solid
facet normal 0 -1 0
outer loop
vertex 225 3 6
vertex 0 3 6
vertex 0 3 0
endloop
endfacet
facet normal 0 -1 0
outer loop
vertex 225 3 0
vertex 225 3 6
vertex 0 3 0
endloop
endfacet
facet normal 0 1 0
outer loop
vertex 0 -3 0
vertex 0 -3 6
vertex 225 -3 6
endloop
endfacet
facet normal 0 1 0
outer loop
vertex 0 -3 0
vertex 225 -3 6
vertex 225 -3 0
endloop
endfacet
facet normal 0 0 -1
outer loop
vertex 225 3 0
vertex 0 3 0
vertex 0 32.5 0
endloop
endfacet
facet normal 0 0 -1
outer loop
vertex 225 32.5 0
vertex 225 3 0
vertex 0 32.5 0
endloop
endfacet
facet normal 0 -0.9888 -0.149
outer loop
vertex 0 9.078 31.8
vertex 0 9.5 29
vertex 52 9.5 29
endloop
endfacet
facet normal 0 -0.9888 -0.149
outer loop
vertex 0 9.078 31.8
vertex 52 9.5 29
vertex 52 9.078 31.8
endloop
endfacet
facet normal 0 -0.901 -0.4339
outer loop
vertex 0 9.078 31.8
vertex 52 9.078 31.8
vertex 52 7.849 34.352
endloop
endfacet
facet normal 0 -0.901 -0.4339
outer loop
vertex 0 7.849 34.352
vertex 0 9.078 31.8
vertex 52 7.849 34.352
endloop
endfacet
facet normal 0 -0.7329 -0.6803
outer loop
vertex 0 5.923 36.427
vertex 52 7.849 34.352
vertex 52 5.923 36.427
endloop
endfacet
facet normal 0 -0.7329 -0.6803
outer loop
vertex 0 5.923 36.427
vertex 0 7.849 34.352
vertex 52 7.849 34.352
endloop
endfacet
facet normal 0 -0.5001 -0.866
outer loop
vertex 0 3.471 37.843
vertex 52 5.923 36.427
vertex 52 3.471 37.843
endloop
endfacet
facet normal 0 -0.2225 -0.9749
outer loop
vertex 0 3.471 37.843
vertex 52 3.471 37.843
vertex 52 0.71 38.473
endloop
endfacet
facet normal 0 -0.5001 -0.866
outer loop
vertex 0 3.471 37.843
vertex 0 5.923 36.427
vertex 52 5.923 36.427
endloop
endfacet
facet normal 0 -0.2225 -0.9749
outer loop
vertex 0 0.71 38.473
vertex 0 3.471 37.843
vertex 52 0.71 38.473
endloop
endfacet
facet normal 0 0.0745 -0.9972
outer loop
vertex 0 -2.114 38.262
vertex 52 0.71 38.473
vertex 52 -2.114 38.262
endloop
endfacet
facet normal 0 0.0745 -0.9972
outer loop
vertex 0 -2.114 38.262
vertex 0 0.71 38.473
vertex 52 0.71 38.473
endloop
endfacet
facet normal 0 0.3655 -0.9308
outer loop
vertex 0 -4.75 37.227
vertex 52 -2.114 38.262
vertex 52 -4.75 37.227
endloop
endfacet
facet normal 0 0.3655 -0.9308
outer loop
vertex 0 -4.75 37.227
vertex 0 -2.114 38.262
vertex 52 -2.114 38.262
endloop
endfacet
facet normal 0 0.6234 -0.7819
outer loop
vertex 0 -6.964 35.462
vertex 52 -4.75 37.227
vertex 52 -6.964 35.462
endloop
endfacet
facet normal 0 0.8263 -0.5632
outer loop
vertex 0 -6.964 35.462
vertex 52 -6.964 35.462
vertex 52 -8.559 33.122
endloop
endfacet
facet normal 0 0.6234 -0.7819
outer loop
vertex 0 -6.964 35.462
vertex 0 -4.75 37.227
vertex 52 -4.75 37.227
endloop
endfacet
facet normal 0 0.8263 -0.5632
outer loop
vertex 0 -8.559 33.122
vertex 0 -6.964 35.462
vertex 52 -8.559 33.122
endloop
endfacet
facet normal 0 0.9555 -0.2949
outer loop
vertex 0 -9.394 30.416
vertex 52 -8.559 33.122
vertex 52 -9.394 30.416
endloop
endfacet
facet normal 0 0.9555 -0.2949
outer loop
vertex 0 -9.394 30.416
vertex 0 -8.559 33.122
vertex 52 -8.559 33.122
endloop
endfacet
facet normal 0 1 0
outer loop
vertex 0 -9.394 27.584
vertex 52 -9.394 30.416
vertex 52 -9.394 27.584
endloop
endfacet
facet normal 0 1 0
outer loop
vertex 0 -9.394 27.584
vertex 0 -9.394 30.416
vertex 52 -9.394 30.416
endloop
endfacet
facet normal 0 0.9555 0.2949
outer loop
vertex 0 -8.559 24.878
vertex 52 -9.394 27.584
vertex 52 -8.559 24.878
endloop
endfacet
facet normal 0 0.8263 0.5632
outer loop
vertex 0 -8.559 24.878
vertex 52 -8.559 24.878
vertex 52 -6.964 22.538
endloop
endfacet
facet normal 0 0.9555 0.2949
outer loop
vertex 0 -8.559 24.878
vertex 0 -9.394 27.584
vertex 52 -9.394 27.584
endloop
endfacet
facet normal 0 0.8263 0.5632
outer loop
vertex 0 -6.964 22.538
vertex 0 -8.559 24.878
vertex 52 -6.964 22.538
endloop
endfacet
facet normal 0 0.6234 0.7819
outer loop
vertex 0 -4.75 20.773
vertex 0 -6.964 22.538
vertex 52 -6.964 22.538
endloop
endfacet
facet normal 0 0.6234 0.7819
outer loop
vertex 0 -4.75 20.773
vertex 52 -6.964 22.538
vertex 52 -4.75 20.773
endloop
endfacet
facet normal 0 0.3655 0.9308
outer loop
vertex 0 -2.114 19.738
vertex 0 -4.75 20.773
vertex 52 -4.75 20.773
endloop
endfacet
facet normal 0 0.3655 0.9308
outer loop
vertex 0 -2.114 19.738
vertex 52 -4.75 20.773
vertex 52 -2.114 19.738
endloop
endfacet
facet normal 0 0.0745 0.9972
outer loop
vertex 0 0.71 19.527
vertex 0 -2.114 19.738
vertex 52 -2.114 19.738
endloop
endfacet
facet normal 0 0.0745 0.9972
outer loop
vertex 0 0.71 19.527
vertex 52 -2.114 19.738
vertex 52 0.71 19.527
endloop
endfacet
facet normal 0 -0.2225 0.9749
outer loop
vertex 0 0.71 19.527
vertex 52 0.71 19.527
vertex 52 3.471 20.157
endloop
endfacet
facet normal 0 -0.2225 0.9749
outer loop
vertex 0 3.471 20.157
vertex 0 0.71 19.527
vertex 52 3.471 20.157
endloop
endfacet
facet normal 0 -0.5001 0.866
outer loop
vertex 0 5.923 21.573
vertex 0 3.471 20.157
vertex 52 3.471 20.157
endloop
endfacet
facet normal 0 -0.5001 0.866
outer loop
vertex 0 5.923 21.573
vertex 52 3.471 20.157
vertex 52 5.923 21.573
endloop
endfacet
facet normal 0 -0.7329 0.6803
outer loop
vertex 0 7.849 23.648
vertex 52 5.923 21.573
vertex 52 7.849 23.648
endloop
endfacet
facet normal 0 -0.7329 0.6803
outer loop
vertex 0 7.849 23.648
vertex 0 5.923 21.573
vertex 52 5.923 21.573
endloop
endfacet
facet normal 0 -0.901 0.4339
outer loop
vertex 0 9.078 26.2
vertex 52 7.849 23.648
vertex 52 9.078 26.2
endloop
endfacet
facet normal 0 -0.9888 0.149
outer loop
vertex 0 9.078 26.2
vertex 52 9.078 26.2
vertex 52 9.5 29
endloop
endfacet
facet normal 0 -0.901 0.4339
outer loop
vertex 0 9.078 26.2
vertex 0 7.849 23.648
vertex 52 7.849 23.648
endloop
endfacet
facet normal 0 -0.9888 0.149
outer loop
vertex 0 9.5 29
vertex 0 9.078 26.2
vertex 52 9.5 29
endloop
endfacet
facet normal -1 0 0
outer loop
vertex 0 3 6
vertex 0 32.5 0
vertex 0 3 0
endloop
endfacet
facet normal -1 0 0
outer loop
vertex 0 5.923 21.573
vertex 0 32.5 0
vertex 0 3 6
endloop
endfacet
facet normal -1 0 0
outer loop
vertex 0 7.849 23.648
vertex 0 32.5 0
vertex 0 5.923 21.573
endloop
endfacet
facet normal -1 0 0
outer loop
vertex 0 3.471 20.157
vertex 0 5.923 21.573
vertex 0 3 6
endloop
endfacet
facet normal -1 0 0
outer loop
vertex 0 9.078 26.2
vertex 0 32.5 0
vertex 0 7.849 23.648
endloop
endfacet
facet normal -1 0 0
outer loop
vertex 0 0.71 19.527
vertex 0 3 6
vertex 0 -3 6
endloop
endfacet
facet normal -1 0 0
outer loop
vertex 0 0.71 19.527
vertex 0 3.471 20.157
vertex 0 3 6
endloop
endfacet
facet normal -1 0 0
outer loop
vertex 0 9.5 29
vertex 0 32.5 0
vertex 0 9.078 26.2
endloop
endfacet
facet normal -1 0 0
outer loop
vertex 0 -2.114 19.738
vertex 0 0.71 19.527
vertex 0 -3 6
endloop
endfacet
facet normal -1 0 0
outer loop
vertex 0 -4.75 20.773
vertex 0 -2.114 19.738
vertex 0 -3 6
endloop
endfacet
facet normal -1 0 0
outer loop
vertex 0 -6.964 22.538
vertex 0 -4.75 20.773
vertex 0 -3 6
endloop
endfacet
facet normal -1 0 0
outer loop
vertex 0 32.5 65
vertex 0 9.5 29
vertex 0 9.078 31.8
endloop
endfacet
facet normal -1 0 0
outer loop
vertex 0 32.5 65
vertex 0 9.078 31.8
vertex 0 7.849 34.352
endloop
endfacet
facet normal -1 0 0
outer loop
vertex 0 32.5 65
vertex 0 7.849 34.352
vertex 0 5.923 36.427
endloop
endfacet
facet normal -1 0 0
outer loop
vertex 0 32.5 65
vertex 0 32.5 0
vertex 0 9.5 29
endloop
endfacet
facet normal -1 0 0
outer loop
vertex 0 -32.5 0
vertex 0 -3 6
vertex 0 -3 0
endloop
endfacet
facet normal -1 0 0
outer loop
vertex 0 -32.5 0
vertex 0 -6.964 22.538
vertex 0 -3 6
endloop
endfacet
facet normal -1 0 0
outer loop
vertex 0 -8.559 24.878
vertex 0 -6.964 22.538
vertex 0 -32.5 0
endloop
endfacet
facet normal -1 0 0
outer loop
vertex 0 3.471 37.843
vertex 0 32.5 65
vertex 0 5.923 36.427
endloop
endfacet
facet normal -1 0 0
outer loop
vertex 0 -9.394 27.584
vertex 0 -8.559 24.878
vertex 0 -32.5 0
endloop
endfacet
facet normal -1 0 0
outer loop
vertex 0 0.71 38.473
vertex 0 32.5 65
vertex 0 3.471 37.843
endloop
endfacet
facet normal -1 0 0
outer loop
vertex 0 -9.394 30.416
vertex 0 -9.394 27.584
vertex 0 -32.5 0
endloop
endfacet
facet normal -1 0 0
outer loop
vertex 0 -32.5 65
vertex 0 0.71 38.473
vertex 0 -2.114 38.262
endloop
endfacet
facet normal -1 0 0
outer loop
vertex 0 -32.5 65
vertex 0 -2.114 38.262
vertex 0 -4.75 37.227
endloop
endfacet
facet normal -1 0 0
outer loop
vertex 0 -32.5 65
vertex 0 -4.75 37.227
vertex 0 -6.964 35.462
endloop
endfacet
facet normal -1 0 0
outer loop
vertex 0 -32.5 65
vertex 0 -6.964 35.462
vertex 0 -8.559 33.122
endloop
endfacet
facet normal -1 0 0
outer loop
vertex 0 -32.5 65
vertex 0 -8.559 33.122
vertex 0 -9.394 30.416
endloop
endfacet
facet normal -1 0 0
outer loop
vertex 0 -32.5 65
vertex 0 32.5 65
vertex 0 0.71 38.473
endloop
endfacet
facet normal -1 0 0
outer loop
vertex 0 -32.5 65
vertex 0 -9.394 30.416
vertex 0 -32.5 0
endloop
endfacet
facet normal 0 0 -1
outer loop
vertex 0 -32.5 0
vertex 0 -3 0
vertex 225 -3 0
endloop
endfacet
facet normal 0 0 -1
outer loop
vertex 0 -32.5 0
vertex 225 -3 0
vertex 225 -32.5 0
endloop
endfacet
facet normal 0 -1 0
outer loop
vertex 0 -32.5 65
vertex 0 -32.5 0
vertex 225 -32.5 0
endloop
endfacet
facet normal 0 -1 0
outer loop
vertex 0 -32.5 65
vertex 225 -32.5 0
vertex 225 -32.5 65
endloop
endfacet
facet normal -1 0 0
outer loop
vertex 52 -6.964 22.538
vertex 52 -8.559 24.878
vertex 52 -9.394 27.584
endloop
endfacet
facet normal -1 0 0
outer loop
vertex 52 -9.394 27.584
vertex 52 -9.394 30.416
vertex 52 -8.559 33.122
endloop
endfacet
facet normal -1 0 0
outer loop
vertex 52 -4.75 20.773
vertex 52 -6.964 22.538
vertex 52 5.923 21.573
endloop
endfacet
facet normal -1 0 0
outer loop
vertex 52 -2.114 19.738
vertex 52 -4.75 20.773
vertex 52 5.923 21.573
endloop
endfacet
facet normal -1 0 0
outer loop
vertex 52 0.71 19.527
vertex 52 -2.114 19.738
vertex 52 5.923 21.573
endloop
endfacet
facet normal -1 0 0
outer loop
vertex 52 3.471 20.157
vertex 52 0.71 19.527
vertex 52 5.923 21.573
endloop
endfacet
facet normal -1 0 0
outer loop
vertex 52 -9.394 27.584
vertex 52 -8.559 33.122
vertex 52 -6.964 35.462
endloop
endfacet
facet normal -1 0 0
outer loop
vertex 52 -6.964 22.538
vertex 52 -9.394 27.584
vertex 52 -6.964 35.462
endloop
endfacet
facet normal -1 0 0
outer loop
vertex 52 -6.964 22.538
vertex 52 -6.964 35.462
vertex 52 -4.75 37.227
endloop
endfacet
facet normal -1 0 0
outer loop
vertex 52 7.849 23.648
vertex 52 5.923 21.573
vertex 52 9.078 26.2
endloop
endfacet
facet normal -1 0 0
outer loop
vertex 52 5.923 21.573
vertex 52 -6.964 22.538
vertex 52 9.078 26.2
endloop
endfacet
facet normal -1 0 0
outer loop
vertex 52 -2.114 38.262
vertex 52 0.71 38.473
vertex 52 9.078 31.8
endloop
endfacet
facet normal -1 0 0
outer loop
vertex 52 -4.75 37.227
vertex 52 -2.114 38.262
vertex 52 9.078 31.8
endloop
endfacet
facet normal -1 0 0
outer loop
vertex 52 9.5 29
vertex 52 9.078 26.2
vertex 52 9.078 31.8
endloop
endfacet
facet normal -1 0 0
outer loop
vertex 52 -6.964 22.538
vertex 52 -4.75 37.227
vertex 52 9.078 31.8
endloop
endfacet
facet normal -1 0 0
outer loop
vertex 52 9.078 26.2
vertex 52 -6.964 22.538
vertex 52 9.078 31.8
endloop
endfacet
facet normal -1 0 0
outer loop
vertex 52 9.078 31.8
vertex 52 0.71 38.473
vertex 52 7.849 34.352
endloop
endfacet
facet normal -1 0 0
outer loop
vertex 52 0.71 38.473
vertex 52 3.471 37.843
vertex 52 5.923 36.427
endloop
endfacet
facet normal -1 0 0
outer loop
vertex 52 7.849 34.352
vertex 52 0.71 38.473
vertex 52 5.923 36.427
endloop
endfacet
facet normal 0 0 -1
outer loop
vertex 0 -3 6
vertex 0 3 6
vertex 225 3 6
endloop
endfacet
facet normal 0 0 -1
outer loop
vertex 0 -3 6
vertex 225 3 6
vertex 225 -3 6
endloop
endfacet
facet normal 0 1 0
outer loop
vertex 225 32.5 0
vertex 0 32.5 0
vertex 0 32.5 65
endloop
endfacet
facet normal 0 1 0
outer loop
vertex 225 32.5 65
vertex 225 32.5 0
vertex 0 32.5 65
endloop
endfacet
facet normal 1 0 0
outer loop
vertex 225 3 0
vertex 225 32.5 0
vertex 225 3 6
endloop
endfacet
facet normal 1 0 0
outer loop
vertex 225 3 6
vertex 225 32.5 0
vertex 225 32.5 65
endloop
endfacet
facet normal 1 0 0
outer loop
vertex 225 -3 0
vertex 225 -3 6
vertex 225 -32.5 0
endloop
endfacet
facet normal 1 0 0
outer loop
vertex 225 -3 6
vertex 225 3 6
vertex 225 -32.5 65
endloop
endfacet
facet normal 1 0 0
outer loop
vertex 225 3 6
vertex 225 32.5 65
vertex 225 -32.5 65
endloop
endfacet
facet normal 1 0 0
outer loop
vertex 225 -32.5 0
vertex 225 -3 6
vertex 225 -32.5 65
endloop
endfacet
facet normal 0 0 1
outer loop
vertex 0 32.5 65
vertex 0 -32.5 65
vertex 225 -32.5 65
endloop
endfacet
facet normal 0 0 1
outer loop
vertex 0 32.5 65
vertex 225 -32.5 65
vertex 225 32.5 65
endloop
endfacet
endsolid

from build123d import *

# Parameters (mm, degrees)
F1_DEPTH = 225
F3_R     = 9.5
F4_DEPTH = 52


with BuildPart() as f1:
    # F0 (on Right) → F1 (new body)
    with BuildSketch(Plane.YZ):
        Polygon((3, 6), (3, 0), (32.5, 0), (32.5, 65), (0, 65), (0, 6), align=None)
    extrude(amount=F1_DEPTH)

    # F2: F1 across plane


with BuildPart() as f1_1:
    add(f1.part)
    add(f1.part.mirror(Plane.XZ))

    # F3 (on Right) → F4 (cut)
    with BuildSketch(Plane.YZ):
        with Locations((0, 29)):
            Circle(F3_R)
    extrude(amount=F4_DEPTH, mode=Mode.SUBTRACT)


solid = f1_1.part
